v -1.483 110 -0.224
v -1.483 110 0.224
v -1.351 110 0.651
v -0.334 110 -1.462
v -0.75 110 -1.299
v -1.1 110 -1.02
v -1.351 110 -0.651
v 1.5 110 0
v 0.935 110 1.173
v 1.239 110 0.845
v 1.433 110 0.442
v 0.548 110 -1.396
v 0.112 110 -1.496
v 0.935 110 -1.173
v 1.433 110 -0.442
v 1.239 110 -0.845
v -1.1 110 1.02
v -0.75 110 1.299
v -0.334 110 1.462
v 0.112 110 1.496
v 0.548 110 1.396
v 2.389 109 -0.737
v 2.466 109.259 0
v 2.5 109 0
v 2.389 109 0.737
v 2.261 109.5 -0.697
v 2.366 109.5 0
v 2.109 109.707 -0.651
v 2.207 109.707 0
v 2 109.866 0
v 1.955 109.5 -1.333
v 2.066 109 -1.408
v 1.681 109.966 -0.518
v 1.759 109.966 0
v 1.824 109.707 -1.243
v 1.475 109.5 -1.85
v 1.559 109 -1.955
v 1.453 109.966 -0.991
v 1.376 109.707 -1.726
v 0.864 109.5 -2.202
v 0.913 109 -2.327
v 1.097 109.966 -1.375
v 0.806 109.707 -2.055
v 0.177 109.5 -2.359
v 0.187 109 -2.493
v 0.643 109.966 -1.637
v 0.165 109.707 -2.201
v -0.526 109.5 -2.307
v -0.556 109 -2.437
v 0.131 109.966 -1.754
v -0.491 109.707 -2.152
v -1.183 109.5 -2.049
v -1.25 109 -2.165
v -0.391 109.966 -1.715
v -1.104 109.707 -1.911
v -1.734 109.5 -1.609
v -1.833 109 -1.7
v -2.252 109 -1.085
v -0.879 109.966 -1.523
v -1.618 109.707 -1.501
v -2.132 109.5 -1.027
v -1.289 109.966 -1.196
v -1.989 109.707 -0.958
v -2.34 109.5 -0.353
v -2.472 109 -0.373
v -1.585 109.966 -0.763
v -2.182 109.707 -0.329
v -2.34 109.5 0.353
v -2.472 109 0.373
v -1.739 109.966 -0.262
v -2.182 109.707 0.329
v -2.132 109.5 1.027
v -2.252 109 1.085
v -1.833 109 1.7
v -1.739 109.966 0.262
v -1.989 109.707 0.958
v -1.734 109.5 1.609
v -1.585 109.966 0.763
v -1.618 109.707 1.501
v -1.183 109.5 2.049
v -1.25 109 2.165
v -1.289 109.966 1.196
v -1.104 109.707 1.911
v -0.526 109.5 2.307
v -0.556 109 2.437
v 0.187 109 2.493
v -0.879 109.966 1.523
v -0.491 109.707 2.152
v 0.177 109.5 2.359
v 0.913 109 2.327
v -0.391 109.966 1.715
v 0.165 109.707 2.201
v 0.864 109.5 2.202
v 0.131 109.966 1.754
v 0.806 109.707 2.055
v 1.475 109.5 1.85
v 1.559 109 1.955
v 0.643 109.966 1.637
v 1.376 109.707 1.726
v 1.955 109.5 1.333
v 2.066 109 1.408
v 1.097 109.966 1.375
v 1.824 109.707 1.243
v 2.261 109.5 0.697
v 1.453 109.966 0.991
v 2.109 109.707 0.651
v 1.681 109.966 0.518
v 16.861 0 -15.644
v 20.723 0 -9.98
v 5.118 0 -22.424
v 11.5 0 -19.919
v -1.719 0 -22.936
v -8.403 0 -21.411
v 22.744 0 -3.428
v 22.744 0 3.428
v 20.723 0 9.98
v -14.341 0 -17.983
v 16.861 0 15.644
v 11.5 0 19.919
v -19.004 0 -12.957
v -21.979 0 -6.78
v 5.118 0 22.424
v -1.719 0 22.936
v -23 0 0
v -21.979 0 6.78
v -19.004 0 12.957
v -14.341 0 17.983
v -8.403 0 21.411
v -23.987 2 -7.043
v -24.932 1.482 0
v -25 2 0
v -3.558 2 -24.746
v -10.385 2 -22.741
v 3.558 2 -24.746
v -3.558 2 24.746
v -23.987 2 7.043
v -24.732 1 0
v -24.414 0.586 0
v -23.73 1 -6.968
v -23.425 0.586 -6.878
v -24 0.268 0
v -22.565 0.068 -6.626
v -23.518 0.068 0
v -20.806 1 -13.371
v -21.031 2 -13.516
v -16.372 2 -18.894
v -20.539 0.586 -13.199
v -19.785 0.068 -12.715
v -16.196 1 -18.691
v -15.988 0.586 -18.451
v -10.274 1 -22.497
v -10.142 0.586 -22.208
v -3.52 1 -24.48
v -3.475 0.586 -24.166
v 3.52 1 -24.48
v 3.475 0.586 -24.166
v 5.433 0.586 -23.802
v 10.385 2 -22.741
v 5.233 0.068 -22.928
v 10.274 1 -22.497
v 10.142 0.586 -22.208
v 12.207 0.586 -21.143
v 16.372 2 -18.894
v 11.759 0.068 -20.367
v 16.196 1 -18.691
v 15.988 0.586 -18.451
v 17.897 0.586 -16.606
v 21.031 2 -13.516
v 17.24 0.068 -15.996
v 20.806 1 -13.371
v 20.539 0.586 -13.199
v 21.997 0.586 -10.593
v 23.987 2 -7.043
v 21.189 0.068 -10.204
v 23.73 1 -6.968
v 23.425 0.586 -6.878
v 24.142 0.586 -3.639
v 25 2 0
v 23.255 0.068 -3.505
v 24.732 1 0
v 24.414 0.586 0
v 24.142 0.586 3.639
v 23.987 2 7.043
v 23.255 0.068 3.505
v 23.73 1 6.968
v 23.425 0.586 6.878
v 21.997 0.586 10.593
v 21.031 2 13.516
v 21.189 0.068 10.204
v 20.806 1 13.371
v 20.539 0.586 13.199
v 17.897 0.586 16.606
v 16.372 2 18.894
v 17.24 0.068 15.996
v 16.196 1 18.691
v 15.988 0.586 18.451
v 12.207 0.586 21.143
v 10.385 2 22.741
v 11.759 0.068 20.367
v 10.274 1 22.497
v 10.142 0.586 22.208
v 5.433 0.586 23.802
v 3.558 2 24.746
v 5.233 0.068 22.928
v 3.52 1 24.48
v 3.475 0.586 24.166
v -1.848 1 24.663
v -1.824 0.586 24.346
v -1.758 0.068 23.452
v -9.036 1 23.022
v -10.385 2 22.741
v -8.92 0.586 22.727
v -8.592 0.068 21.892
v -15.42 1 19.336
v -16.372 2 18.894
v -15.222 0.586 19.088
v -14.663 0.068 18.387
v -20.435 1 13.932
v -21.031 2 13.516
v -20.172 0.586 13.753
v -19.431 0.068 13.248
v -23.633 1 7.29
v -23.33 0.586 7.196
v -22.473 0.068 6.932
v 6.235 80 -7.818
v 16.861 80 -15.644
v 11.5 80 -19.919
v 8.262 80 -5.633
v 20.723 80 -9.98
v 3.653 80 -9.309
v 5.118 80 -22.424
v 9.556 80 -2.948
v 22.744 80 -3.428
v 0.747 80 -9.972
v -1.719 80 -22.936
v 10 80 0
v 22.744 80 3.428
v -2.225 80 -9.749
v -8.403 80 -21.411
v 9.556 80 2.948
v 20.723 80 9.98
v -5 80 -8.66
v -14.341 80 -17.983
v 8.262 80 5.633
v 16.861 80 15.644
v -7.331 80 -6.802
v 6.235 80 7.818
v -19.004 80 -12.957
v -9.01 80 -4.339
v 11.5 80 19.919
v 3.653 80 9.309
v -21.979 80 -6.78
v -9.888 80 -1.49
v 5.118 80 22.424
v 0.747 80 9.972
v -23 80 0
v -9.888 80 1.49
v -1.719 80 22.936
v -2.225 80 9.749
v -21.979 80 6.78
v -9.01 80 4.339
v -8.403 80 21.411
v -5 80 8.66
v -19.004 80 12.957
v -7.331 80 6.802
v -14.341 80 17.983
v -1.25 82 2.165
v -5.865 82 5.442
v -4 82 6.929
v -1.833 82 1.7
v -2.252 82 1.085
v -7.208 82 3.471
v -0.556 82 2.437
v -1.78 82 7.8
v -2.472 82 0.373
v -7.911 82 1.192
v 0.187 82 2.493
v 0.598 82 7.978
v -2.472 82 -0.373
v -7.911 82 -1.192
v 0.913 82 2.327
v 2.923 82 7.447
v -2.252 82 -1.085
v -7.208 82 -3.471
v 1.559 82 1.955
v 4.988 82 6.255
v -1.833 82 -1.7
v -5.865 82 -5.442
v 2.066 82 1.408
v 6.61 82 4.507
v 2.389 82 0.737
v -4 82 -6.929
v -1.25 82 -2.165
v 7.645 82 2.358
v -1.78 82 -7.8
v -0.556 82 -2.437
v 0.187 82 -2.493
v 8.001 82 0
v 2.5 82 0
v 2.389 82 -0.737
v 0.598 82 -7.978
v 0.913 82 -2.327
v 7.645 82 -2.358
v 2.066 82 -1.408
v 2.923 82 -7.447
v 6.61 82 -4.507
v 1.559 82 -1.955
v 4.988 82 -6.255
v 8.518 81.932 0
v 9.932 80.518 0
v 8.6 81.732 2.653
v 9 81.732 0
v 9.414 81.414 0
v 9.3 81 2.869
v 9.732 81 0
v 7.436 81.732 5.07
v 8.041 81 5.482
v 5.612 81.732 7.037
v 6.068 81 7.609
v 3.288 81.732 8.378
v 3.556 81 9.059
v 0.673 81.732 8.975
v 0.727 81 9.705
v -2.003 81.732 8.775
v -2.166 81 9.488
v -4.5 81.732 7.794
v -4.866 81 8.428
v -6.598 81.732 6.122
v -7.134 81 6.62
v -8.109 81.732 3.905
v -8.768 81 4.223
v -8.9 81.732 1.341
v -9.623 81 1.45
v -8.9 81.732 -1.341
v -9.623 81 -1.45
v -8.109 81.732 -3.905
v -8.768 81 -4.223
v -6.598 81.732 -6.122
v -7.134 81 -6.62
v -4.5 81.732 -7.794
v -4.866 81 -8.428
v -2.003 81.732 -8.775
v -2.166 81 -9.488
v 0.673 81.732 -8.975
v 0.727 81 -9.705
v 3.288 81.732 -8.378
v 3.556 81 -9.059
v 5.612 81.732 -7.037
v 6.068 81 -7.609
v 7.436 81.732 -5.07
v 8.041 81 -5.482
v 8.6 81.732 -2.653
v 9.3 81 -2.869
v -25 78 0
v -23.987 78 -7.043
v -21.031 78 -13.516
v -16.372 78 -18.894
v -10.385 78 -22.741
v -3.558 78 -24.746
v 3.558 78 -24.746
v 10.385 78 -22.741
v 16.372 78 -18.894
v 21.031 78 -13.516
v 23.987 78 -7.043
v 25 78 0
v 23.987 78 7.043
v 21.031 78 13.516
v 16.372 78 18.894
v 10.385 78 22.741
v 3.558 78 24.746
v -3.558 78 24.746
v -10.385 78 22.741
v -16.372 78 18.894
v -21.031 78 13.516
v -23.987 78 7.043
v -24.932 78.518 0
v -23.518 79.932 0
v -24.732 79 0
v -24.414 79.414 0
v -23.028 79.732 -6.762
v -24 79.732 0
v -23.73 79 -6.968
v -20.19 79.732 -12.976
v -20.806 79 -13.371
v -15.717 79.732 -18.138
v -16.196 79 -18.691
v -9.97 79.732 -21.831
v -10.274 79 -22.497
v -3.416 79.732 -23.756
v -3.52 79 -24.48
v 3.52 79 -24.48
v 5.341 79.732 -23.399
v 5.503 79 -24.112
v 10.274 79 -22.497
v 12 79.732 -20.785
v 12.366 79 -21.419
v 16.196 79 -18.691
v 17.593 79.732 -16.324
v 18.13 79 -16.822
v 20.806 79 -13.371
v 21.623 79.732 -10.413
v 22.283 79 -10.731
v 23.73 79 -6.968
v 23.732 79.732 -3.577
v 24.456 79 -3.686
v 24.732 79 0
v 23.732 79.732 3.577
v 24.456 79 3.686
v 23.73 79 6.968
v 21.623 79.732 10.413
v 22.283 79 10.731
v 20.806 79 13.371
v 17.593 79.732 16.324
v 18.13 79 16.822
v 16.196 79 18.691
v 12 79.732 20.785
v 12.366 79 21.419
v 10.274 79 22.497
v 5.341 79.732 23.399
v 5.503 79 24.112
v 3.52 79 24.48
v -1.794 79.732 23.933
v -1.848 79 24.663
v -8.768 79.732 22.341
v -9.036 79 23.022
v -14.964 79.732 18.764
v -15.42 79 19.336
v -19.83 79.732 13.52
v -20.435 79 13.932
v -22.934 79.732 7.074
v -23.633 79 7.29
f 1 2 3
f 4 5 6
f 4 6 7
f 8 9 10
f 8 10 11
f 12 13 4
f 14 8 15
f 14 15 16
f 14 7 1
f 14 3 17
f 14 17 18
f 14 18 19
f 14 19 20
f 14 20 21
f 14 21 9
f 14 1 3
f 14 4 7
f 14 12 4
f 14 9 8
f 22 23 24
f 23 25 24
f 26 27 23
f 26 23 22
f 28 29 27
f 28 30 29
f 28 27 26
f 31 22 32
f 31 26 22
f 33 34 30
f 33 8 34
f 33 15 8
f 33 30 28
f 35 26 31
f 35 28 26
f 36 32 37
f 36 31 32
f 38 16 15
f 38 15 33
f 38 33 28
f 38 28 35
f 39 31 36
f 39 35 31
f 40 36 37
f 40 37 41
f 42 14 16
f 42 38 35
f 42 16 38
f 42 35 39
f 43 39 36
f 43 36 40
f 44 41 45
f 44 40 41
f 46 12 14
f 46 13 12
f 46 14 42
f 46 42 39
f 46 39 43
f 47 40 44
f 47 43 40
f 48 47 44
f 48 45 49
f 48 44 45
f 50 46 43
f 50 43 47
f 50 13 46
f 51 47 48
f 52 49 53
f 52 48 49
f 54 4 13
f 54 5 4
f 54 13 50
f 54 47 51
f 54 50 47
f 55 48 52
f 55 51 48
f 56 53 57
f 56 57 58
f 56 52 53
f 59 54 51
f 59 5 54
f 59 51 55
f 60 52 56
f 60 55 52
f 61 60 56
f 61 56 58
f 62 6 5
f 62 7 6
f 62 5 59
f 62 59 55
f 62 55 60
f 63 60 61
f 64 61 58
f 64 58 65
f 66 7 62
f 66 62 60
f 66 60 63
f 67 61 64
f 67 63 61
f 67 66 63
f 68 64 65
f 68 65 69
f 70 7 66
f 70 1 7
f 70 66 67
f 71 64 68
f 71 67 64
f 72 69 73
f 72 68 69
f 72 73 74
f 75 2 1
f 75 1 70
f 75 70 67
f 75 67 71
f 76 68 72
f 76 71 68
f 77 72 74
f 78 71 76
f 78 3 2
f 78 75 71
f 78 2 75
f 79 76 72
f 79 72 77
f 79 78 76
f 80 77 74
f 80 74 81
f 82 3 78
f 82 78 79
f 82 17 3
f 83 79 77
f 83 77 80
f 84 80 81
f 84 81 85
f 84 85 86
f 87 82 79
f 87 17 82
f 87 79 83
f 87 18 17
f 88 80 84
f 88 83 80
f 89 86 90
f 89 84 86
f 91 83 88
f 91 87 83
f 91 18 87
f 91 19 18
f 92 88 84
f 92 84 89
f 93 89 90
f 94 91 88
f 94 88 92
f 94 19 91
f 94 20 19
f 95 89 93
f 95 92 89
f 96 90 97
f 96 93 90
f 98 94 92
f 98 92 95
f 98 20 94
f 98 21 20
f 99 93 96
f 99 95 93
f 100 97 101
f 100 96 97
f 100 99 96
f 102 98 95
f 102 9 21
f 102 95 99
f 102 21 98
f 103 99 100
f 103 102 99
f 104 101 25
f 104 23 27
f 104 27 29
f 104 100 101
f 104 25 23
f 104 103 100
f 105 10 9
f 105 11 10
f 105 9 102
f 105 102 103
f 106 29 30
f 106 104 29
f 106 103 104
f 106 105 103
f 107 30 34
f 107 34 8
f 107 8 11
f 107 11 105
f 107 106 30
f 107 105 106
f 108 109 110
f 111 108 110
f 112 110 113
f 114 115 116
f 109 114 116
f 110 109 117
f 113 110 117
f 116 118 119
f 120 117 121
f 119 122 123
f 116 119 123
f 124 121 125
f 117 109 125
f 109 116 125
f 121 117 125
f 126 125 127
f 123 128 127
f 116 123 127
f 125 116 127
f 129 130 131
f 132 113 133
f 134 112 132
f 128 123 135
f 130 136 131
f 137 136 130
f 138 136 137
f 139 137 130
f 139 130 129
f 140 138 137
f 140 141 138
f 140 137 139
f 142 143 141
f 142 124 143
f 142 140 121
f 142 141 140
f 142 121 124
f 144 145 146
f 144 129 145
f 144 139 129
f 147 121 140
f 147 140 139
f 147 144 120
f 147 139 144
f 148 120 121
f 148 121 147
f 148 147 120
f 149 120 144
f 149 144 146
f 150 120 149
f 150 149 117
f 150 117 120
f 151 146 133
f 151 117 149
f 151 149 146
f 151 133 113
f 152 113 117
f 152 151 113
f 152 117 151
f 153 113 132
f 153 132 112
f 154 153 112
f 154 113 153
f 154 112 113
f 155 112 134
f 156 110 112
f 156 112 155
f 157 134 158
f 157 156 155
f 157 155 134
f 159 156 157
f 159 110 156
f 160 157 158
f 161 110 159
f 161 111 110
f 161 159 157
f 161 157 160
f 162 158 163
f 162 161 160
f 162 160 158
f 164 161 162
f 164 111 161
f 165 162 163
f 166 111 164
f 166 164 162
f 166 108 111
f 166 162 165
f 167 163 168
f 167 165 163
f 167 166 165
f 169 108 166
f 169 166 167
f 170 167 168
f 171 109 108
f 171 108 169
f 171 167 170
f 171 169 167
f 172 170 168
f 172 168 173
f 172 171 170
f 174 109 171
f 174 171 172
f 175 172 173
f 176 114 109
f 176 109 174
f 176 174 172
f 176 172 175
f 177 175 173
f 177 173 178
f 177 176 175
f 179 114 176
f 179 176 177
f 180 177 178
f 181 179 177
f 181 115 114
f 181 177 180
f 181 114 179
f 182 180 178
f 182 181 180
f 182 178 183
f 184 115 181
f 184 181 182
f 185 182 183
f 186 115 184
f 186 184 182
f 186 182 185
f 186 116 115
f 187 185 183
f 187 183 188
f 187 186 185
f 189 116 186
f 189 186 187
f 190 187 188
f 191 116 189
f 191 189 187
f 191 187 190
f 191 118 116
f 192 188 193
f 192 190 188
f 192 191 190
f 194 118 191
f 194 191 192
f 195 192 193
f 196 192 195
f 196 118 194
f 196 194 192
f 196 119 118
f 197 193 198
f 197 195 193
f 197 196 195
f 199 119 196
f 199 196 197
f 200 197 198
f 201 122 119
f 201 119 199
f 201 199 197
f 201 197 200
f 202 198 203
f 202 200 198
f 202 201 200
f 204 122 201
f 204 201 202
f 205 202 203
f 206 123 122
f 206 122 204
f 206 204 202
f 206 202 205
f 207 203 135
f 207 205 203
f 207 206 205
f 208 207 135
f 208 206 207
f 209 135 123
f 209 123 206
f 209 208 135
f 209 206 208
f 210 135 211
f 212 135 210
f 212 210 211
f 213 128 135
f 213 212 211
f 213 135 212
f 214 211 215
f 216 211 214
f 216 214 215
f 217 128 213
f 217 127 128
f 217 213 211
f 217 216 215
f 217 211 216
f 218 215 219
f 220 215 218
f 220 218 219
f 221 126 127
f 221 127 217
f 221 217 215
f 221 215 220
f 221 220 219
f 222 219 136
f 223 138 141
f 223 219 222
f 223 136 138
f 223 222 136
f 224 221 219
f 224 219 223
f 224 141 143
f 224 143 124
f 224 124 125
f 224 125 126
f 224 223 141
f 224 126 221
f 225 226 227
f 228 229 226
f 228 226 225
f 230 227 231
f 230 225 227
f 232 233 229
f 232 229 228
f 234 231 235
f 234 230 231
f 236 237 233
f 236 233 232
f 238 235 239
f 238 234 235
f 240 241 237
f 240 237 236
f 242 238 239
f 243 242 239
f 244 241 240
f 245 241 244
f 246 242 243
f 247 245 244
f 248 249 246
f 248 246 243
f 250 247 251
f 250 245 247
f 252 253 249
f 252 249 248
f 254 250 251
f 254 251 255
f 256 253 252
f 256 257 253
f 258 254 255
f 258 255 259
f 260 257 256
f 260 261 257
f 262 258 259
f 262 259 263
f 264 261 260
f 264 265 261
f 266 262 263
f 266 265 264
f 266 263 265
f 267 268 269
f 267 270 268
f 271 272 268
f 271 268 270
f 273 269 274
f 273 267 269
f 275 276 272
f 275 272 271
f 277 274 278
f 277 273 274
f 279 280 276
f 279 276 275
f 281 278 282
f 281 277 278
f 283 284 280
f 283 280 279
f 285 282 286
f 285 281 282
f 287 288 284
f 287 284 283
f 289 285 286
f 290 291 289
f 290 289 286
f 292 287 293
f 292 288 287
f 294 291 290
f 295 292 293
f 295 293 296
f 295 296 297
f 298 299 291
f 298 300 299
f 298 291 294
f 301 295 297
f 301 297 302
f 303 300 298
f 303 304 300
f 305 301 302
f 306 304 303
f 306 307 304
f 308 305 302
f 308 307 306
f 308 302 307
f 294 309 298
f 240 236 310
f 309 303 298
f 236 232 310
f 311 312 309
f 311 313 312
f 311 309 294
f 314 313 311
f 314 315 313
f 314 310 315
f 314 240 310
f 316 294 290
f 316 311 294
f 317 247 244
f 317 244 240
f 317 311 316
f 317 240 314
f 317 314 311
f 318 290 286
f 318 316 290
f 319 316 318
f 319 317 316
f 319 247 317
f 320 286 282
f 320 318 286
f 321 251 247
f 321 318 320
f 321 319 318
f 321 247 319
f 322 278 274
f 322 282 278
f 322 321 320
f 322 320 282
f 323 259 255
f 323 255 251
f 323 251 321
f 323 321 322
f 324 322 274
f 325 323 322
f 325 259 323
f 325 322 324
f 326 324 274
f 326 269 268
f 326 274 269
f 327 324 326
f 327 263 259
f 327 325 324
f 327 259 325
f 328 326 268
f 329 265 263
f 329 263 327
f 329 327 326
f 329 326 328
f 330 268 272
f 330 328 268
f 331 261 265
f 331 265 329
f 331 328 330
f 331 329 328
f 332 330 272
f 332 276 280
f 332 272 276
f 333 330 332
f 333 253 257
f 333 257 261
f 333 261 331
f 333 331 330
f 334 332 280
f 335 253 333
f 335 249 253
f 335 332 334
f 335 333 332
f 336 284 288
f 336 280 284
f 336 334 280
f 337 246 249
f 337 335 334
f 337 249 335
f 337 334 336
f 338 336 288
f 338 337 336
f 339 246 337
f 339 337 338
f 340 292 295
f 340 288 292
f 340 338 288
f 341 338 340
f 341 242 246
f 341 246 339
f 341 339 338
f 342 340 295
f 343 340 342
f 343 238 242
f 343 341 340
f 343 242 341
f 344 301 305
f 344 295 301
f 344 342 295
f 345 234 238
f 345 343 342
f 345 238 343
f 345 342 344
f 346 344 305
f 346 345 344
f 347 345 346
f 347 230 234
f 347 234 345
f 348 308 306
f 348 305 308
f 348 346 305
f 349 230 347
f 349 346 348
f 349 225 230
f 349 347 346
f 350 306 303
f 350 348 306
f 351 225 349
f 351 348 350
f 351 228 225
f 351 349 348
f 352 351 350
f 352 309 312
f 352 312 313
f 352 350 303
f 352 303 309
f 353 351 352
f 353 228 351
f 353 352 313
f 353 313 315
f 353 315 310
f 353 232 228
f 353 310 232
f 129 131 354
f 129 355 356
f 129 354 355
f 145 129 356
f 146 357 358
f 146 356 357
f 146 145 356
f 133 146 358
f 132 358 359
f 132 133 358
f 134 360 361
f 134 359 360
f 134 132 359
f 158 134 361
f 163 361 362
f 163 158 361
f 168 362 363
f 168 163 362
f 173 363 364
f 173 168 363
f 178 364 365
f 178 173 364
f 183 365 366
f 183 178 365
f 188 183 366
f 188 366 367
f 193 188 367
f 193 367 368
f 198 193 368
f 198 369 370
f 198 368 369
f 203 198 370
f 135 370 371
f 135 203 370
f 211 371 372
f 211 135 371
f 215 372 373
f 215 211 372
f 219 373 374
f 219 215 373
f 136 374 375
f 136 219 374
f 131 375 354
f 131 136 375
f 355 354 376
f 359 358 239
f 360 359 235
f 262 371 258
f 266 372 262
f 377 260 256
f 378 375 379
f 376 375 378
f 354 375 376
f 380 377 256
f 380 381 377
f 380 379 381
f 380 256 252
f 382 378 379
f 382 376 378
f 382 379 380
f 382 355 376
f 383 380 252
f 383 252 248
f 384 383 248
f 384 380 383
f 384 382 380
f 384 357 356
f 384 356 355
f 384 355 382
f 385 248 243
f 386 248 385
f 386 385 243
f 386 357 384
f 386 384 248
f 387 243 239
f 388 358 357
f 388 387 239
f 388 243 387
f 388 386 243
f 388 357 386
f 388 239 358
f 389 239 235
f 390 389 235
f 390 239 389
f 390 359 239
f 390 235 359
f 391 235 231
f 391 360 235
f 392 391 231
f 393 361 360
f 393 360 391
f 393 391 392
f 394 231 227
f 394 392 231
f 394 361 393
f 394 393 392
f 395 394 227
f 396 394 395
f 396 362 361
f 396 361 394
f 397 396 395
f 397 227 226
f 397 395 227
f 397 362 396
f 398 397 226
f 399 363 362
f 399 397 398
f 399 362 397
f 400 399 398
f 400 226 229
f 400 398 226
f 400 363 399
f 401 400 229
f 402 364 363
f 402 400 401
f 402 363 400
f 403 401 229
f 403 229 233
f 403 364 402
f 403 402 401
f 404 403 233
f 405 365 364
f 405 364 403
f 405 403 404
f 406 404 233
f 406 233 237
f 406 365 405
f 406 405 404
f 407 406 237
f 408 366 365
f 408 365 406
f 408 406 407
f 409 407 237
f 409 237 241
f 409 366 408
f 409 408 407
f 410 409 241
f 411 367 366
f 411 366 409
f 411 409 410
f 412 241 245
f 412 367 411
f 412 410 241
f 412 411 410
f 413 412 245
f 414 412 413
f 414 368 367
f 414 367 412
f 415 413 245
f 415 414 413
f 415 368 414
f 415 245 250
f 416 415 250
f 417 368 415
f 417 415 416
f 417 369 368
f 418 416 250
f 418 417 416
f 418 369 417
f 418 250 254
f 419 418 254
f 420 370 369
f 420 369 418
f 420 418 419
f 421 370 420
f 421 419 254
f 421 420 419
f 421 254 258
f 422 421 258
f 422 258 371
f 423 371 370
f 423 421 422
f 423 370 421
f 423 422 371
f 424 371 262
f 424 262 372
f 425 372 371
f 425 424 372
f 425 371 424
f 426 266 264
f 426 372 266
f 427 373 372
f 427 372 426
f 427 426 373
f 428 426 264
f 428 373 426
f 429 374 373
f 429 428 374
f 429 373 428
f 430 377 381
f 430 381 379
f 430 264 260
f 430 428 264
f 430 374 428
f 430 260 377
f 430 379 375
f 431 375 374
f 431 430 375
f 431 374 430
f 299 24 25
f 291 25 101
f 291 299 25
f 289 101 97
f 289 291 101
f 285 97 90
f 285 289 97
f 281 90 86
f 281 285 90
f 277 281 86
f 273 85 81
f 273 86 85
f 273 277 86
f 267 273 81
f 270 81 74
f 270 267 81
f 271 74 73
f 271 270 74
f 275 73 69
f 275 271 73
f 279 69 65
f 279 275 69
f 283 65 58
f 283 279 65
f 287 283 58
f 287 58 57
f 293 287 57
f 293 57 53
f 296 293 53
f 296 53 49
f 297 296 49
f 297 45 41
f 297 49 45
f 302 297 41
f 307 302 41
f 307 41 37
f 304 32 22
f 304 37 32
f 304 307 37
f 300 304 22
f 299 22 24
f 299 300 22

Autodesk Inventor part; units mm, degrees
ref_plane "YZ Plane" through (0, 0, 0) normal (1, 0, 0) x (0, 1, 0)
ref_plane "XZ Plane" through (0, 0, 0) normal (0, 1, 0) x (-1, 0, 0)
ref_plane "XY Plane" through (0, 0, 0) normal (0, 0, 1) x (1, 0, 0)
sketch "Sketch1" plane through (0, 0, 0) normal (0, 1, 0) x (-1, 0, 0)
  circle A0 centre (0, 0) radius 25
  dimension "d0" = 50
extrude "Extrusion1" add sketch "Sketch1" along normal blind 80
sketch "Sketch2" plane through (0, 80, 0) normal (0, 1, 0) x (1, 0, 0)
  circle A0 centre (0, 0) radius 10
  circle A1 centre (0, 0) radius 2.5
  dimension "d3" = 20
  dimension "d4" = 5
extrude "Extrusion2" add sketch "Sketch2" along normal blind 2 contours A0 | A1
extrude "Extrusion3" add sketch "Sketch2" along normal blind 30 contours A1
fillet "Fillet1" radius 2 3 edges at (25, 0, 0) (25, 80, 0) (-10, 82, 0)
fillet "Fillet2" radius 1 1 edges at (-2.5, 110, 0)
properties part number "Motor DC" material "Stainless Steel, Brushed"
